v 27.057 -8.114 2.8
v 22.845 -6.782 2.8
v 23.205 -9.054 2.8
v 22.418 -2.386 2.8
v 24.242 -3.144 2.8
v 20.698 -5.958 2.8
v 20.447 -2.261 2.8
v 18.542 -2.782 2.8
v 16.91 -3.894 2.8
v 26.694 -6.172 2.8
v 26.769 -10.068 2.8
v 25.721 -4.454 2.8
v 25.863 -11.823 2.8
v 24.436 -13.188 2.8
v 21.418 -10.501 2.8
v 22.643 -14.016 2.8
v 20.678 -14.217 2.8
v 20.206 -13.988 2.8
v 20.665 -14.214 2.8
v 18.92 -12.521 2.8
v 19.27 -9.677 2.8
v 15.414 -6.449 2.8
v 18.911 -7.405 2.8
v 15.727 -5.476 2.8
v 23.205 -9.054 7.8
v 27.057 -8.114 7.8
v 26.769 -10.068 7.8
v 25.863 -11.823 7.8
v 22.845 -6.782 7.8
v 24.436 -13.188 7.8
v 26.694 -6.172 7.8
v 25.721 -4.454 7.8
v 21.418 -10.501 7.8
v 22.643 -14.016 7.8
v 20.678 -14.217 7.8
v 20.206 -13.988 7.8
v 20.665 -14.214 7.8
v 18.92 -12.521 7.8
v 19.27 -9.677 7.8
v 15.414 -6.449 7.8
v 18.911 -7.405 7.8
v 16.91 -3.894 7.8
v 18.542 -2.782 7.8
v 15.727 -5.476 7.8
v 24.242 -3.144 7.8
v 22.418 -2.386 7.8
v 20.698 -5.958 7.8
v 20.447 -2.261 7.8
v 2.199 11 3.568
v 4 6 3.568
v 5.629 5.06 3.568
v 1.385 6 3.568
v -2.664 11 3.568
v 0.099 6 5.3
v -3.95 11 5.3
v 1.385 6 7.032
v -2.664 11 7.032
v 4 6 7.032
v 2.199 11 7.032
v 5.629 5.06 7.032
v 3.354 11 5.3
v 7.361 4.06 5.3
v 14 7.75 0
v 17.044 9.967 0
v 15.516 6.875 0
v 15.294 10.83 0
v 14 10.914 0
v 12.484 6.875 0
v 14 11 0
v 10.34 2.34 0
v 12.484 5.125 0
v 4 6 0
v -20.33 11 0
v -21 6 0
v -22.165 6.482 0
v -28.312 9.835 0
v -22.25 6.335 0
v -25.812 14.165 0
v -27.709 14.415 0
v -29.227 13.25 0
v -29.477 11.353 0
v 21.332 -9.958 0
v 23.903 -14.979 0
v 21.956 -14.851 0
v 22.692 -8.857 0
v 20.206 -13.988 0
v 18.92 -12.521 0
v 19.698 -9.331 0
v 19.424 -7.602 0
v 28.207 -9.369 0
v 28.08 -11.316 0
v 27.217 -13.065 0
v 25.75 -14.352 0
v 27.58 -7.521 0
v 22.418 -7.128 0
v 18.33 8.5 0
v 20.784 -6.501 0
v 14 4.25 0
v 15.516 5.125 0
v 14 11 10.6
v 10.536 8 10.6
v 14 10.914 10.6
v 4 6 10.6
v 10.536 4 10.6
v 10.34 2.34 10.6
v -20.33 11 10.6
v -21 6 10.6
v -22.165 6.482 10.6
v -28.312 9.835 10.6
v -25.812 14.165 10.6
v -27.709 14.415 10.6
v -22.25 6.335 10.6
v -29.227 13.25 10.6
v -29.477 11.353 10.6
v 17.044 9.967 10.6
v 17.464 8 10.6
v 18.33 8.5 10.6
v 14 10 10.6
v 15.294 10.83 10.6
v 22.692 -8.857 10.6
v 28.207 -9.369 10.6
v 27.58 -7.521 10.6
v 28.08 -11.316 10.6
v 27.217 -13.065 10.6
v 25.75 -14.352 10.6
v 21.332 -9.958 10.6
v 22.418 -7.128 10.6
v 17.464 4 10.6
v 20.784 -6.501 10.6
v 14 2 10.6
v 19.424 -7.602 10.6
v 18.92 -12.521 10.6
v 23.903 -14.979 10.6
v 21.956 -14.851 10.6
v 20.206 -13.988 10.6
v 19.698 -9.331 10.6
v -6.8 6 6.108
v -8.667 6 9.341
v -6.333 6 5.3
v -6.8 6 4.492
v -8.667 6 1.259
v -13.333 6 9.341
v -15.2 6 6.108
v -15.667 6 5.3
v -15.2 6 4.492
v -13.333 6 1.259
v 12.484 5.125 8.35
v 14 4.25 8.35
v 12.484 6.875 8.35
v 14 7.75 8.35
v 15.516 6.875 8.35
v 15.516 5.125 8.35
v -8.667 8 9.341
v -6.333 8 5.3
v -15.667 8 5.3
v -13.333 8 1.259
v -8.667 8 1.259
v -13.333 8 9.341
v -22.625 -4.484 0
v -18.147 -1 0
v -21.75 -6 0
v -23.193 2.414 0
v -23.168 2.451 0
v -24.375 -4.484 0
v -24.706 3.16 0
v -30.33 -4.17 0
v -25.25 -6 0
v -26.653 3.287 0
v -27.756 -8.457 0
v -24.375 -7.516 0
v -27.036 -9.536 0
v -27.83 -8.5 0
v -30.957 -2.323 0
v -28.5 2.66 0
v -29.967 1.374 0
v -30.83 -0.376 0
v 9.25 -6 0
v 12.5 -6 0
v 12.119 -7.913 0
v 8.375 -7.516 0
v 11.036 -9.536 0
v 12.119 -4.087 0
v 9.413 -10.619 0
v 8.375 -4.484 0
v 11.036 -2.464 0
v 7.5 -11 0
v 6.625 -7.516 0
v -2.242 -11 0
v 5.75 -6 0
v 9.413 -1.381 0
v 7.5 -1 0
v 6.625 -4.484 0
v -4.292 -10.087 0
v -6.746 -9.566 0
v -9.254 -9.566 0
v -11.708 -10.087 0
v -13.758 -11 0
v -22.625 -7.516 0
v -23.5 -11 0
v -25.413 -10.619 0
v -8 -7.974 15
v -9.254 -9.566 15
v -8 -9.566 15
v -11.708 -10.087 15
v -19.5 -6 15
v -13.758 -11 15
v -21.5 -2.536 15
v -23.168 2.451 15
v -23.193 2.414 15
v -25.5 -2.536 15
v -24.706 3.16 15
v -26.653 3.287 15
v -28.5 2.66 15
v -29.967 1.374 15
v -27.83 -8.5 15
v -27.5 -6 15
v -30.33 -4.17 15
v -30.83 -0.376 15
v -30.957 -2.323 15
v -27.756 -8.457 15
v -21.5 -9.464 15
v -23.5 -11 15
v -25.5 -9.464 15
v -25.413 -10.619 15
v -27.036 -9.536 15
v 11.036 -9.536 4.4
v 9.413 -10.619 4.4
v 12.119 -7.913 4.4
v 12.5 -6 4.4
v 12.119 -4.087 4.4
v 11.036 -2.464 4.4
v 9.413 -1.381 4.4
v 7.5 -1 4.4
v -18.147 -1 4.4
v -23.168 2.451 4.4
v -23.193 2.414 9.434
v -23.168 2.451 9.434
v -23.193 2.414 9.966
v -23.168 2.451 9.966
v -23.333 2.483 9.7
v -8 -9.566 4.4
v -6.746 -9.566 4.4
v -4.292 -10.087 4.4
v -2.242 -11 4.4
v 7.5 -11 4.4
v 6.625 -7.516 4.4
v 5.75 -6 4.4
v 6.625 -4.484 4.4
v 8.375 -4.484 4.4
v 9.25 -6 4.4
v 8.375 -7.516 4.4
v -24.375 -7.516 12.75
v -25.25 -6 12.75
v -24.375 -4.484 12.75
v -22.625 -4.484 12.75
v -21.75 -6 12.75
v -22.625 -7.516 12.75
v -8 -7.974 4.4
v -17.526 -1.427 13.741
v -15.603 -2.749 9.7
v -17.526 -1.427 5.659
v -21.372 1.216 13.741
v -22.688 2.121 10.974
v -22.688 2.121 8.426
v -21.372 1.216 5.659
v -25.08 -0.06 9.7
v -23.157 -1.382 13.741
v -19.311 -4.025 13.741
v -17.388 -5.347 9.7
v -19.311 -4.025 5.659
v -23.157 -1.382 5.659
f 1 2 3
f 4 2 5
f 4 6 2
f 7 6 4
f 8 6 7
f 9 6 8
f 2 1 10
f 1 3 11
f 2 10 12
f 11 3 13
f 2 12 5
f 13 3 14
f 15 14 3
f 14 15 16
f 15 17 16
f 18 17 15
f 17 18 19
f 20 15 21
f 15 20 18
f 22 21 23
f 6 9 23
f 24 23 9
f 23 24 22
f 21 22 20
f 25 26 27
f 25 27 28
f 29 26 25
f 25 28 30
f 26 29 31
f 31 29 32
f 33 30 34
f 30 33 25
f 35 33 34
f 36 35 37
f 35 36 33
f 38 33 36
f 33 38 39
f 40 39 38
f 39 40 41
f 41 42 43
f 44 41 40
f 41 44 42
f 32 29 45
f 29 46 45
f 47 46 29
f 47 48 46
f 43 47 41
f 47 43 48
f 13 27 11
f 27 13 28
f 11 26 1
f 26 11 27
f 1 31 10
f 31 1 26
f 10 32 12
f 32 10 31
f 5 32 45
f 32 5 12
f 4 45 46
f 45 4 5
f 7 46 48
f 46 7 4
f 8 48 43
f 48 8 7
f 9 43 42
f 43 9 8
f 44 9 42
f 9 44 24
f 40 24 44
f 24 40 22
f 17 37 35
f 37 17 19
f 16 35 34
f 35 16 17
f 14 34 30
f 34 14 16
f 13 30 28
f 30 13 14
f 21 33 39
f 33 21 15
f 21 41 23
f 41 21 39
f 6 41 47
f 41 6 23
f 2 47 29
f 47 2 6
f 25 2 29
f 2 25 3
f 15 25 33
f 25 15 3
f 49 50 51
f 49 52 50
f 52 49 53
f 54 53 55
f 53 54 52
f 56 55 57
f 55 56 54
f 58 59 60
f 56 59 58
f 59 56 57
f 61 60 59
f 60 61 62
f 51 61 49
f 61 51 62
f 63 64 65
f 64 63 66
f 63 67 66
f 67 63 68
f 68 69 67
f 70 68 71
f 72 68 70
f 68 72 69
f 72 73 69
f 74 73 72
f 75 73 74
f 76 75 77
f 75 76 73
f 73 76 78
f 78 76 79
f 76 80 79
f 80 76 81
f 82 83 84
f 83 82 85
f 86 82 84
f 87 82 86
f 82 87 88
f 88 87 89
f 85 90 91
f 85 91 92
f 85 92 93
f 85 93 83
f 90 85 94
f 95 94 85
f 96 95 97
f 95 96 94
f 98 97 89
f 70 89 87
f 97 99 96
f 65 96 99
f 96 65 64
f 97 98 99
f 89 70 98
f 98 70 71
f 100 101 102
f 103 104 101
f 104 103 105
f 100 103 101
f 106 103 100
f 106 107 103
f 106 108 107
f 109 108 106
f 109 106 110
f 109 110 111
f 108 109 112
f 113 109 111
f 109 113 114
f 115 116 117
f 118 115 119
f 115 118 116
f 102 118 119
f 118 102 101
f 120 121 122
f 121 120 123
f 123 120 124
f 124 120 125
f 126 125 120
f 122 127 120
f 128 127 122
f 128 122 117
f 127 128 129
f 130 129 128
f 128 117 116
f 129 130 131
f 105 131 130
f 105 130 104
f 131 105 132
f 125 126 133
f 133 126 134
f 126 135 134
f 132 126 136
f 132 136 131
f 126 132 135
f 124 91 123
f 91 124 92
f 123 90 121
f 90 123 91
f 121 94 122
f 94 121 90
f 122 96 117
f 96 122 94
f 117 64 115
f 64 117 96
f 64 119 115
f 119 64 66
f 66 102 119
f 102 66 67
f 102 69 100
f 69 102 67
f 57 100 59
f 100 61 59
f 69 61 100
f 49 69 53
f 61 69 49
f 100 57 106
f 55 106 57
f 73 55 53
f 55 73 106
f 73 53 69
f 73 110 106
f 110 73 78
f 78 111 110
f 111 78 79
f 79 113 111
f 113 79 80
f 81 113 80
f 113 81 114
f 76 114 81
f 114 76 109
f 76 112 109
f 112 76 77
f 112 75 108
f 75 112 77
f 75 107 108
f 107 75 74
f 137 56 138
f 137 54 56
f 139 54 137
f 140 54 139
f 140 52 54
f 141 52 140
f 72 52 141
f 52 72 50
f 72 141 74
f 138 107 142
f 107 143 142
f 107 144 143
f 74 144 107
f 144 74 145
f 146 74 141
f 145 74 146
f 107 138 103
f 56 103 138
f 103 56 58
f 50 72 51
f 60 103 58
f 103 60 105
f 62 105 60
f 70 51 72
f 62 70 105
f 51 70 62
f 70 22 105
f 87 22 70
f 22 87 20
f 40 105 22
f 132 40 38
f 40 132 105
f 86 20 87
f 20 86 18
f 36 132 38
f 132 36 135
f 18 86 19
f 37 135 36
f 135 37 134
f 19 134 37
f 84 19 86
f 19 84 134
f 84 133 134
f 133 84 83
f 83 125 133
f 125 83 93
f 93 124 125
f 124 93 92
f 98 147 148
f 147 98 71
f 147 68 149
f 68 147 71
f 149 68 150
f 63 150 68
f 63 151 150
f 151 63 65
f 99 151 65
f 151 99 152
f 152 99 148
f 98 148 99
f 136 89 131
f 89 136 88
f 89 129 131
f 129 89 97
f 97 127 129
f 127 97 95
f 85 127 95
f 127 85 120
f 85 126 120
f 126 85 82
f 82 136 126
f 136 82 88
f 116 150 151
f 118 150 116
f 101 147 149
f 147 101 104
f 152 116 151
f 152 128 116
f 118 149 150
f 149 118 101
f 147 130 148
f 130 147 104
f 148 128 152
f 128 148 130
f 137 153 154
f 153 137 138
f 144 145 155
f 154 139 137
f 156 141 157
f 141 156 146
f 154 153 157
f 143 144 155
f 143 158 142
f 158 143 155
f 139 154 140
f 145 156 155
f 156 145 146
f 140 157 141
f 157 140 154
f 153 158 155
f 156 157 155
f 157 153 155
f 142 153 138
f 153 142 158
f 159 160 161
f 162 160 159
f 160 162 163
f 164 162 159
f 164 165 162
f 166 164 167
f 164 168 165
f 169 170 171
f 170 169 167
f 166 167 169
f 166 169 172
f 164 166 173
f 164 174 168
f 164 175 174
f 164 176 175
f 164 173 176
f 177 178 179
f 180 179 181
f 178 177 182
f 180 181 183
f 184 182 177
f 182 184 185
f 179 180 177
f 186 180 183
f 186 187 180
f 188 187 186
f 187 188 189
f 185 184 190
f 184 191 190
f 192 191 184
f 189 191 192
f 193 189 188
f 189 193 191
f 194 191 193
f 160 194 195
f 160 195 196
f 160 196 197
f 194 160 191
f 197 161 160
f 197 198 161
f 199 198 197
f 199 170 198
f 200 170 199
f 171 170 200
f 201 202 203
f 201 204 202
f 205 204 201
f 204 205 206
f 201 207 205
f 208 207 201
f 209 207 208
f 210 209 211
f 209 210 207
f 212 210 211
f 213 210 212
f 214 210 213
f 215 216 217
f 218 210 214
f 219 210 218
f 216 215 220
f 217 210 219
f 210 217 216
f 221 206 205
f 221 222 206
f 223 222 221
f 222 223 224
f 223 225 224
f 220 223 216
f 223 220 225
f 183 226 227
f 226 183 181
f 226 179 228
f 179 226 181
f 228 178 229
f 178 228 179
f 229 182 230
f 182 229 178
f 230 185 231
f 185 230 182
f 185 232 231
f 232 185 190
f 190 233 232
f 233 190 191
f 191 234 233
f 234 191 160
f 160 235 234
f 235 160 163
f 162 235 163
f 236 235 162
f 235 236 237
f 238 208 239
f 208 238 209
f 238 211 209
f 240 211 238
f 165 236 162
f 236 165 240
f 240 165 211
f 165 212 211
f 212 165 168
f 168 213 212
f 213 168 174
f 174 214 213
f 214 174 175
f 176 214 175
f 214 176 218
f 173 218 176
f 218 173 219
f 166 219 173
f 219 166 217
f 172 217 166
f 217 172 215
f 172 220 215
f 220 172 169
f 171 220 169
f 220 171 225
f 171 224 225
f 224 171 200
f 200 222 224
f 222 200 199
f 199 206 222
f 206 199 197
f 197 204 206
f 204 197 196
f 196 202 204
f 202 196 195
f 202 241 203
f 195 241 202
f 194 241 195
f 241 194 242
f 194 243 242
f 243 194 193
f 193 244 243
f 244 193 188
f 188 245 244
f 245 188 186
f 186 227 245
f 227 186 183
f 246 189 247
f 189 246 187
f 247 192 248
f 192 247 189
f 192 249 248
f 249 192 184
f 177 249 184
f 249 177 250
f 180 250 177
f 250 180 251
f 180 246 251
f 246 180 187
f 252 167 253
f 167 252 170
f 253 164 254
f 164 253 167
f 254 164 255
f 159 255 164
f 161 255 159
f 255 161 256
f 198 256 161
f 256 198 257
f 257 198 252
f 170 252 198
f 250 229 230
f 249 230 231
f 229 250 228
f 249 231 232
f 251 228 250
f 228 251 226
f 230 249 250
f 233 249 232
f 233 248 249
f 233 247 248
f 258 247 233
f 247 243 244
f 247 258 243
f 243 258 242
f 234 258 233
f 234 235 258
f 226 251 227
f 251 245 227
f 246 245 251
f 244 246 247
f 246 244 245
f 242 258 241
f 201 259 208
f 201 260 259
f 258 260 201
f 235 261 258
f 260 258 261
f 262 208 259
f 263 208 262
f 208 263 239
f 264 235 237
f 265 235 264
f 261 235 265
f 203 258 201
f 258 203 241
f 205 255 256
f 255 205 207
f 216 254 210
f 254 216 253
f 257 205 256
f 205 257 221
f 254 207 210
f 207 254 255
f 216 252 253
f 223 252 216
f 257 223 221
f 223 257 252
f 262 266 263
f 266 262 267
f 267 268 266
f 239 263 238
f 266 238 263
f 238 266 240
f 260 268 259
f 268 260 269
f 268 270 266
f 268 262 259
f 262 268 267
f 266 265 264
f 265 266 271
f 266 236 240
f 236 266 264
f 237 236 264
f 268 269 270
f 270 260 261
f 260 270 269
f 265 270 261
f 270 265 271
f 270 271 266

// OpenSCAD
filament_d = 1.75;
spring_d = 8;
countersink = true;

//!for (side = [0, 1]) mirror([0, side, 0]) translate([0, 16, 0])
!
//mirror([1, 0, 0]) //uncomment for reverse
union() {
	translate([14, 6, 0]) rotate(30) idler();
	translate([-8, -6, 0]) base();
}

%translate([0, 6.5, 9.65]) union() {
	rotate([0, 180, 0]) import("MP1703-MK7-Filament-Drive-Block-Back.stl", convexity = 5);
	import("MP1794-MK7-Filament-Drive-Block-Front.stl", convexity = 5);
}
translate([0, 15.5, 0]) base();
translate([15.5, 15.5, 0]) {
	%translate([-15.5, -15.5, 0]) translate([10.56 / 2 + 5 + filament_d, 0, 7.7]) linear_extrude(height = 4, convexity = 5) difference() {
		circle(5);
		circle(1.5, $fn = 6);
	}

	translate([0, 0, 9.4 - 5]) rotate(-9) idler();
}
%translate([0, 0, 2]) difference() {
	linear_extrude(height = 11, convexity = 5) difference() {
		circle(6.3);
		circle(2.5);
	}
	translate([0, 0, 7.7]) rotate_extrude(convexity = 5, $fs = 0.5) translate([5 + 2.5, 0, 0]) circle(r = 2);
}

module idler() difference() {
	linear_extrude(height = 10.6, convexity = 5) difference() {
		union() {
			circle(5);
			translate([0, -18.5, 0]) circle(5);
			rotate(180) translate([-5, 0, 0]) square([10, 18.5]);
			rotate(60) translate([0, 0, 0]) square([5, 35]);
			rotate(60) translate([2.5, 35, 0]) {
				circle(2.5);
				rotate(-30) {
					translate([-2.5, 0, 0]) square([5, 7]);
					translate([0, 7, 0]) circle(2.5);
				}
			}
			rotate(30) translate([-5, 0, 0]) square([5, 10]);
		}
		circle(3 * 7/12, $fn = 6);
		rotate(9) translate([-15.5 + 10.56 / 2 + 5 + filament_d, -15.5, 0]) circle(3 * 7/12, $fn = 6);
	}
	translate([0, 0, 5.3]) {
		rotate(9) translate([-15.5 + 10.56 / 2 + 5 + filament_d, -15.5, 0]) linear_extrude(height = 5, convexity = 5, center = true) difference() {
			circle(6);
			circle(2.3, $fn = 6);
		}
		translate([10.56 / 2 + 1.5, 0, 0]) rotate([-90, 0, 9]) translate([-15.5, 0, -15.5]) cylinder(r = 2, h = 50, $fn = 6);
		translate([10.56 / 2 + 1.5, 0, 0]) rotate([-90, 0, 0]) translate([-15.5, 0, -15.5]) rotate([0, 0, 0]) cylinder(r = 2, h = 100, center = true, $fn = 6);
	}
	if (countersink) translate([0, 0, 10.6 - 4]) cylinder(r1 = 0, r2 = 8, h = 8, $fn = 6);
	translate([0, 0, 10.6 / 2]) rotate([90, 0, -30]) translate([-25, 0, -2]) cylinder(r = spring_d * 7/12, h = 10, $fn = 6);
}

module base() difference() {
	linear_extrude(height = 15, convexity = 5) difference() {
		union() {
			square([31, 10], center = true);
			translate([-15.5, 0, 0]) rotate(120) {
				translate([0, -5, 0]) square([5, 10]);
				translate([5, 0, 0]) circle(5);
				translate([5, 0, 0]) rotate(-150 - 9 / 2) square([15, 5]);			
			}
			for (side = [1, -1]) translate([side * 15.5, 0, 0]) circle(5);
		}
		for (side = [1, -1]) translate([side * 15.5, 0, 0]) circle(3 * 7/12, $fn = 6);
		translate([0, -15.5, 0]) circle(12);
	}
	translate([0, 0, 4.4]) linear_extrude(height = 15, convexity = 5) {
		translate([-15.5, 0, 0]) rotate(30) translate([0, 5, 0]) rotate(-60 - 9 / 2) translate([-5, 5, 0]) square(100);
		translate([0, -10, 0]) square(100);
	}
	if (countersink) translate([-15.5, 0, 15 - 4]) cylinder(r1 = 0, r2 = 8, h = 8, $fn = 6);
	translate([-15.5, 0, 4.4 + 10.6 / 2]) rotate([90, 0, 150 - 4.5]) translate([0, 0, 4]) cylinder(r = spring_d * 7/12, h = 10, $fn = 6);
}
